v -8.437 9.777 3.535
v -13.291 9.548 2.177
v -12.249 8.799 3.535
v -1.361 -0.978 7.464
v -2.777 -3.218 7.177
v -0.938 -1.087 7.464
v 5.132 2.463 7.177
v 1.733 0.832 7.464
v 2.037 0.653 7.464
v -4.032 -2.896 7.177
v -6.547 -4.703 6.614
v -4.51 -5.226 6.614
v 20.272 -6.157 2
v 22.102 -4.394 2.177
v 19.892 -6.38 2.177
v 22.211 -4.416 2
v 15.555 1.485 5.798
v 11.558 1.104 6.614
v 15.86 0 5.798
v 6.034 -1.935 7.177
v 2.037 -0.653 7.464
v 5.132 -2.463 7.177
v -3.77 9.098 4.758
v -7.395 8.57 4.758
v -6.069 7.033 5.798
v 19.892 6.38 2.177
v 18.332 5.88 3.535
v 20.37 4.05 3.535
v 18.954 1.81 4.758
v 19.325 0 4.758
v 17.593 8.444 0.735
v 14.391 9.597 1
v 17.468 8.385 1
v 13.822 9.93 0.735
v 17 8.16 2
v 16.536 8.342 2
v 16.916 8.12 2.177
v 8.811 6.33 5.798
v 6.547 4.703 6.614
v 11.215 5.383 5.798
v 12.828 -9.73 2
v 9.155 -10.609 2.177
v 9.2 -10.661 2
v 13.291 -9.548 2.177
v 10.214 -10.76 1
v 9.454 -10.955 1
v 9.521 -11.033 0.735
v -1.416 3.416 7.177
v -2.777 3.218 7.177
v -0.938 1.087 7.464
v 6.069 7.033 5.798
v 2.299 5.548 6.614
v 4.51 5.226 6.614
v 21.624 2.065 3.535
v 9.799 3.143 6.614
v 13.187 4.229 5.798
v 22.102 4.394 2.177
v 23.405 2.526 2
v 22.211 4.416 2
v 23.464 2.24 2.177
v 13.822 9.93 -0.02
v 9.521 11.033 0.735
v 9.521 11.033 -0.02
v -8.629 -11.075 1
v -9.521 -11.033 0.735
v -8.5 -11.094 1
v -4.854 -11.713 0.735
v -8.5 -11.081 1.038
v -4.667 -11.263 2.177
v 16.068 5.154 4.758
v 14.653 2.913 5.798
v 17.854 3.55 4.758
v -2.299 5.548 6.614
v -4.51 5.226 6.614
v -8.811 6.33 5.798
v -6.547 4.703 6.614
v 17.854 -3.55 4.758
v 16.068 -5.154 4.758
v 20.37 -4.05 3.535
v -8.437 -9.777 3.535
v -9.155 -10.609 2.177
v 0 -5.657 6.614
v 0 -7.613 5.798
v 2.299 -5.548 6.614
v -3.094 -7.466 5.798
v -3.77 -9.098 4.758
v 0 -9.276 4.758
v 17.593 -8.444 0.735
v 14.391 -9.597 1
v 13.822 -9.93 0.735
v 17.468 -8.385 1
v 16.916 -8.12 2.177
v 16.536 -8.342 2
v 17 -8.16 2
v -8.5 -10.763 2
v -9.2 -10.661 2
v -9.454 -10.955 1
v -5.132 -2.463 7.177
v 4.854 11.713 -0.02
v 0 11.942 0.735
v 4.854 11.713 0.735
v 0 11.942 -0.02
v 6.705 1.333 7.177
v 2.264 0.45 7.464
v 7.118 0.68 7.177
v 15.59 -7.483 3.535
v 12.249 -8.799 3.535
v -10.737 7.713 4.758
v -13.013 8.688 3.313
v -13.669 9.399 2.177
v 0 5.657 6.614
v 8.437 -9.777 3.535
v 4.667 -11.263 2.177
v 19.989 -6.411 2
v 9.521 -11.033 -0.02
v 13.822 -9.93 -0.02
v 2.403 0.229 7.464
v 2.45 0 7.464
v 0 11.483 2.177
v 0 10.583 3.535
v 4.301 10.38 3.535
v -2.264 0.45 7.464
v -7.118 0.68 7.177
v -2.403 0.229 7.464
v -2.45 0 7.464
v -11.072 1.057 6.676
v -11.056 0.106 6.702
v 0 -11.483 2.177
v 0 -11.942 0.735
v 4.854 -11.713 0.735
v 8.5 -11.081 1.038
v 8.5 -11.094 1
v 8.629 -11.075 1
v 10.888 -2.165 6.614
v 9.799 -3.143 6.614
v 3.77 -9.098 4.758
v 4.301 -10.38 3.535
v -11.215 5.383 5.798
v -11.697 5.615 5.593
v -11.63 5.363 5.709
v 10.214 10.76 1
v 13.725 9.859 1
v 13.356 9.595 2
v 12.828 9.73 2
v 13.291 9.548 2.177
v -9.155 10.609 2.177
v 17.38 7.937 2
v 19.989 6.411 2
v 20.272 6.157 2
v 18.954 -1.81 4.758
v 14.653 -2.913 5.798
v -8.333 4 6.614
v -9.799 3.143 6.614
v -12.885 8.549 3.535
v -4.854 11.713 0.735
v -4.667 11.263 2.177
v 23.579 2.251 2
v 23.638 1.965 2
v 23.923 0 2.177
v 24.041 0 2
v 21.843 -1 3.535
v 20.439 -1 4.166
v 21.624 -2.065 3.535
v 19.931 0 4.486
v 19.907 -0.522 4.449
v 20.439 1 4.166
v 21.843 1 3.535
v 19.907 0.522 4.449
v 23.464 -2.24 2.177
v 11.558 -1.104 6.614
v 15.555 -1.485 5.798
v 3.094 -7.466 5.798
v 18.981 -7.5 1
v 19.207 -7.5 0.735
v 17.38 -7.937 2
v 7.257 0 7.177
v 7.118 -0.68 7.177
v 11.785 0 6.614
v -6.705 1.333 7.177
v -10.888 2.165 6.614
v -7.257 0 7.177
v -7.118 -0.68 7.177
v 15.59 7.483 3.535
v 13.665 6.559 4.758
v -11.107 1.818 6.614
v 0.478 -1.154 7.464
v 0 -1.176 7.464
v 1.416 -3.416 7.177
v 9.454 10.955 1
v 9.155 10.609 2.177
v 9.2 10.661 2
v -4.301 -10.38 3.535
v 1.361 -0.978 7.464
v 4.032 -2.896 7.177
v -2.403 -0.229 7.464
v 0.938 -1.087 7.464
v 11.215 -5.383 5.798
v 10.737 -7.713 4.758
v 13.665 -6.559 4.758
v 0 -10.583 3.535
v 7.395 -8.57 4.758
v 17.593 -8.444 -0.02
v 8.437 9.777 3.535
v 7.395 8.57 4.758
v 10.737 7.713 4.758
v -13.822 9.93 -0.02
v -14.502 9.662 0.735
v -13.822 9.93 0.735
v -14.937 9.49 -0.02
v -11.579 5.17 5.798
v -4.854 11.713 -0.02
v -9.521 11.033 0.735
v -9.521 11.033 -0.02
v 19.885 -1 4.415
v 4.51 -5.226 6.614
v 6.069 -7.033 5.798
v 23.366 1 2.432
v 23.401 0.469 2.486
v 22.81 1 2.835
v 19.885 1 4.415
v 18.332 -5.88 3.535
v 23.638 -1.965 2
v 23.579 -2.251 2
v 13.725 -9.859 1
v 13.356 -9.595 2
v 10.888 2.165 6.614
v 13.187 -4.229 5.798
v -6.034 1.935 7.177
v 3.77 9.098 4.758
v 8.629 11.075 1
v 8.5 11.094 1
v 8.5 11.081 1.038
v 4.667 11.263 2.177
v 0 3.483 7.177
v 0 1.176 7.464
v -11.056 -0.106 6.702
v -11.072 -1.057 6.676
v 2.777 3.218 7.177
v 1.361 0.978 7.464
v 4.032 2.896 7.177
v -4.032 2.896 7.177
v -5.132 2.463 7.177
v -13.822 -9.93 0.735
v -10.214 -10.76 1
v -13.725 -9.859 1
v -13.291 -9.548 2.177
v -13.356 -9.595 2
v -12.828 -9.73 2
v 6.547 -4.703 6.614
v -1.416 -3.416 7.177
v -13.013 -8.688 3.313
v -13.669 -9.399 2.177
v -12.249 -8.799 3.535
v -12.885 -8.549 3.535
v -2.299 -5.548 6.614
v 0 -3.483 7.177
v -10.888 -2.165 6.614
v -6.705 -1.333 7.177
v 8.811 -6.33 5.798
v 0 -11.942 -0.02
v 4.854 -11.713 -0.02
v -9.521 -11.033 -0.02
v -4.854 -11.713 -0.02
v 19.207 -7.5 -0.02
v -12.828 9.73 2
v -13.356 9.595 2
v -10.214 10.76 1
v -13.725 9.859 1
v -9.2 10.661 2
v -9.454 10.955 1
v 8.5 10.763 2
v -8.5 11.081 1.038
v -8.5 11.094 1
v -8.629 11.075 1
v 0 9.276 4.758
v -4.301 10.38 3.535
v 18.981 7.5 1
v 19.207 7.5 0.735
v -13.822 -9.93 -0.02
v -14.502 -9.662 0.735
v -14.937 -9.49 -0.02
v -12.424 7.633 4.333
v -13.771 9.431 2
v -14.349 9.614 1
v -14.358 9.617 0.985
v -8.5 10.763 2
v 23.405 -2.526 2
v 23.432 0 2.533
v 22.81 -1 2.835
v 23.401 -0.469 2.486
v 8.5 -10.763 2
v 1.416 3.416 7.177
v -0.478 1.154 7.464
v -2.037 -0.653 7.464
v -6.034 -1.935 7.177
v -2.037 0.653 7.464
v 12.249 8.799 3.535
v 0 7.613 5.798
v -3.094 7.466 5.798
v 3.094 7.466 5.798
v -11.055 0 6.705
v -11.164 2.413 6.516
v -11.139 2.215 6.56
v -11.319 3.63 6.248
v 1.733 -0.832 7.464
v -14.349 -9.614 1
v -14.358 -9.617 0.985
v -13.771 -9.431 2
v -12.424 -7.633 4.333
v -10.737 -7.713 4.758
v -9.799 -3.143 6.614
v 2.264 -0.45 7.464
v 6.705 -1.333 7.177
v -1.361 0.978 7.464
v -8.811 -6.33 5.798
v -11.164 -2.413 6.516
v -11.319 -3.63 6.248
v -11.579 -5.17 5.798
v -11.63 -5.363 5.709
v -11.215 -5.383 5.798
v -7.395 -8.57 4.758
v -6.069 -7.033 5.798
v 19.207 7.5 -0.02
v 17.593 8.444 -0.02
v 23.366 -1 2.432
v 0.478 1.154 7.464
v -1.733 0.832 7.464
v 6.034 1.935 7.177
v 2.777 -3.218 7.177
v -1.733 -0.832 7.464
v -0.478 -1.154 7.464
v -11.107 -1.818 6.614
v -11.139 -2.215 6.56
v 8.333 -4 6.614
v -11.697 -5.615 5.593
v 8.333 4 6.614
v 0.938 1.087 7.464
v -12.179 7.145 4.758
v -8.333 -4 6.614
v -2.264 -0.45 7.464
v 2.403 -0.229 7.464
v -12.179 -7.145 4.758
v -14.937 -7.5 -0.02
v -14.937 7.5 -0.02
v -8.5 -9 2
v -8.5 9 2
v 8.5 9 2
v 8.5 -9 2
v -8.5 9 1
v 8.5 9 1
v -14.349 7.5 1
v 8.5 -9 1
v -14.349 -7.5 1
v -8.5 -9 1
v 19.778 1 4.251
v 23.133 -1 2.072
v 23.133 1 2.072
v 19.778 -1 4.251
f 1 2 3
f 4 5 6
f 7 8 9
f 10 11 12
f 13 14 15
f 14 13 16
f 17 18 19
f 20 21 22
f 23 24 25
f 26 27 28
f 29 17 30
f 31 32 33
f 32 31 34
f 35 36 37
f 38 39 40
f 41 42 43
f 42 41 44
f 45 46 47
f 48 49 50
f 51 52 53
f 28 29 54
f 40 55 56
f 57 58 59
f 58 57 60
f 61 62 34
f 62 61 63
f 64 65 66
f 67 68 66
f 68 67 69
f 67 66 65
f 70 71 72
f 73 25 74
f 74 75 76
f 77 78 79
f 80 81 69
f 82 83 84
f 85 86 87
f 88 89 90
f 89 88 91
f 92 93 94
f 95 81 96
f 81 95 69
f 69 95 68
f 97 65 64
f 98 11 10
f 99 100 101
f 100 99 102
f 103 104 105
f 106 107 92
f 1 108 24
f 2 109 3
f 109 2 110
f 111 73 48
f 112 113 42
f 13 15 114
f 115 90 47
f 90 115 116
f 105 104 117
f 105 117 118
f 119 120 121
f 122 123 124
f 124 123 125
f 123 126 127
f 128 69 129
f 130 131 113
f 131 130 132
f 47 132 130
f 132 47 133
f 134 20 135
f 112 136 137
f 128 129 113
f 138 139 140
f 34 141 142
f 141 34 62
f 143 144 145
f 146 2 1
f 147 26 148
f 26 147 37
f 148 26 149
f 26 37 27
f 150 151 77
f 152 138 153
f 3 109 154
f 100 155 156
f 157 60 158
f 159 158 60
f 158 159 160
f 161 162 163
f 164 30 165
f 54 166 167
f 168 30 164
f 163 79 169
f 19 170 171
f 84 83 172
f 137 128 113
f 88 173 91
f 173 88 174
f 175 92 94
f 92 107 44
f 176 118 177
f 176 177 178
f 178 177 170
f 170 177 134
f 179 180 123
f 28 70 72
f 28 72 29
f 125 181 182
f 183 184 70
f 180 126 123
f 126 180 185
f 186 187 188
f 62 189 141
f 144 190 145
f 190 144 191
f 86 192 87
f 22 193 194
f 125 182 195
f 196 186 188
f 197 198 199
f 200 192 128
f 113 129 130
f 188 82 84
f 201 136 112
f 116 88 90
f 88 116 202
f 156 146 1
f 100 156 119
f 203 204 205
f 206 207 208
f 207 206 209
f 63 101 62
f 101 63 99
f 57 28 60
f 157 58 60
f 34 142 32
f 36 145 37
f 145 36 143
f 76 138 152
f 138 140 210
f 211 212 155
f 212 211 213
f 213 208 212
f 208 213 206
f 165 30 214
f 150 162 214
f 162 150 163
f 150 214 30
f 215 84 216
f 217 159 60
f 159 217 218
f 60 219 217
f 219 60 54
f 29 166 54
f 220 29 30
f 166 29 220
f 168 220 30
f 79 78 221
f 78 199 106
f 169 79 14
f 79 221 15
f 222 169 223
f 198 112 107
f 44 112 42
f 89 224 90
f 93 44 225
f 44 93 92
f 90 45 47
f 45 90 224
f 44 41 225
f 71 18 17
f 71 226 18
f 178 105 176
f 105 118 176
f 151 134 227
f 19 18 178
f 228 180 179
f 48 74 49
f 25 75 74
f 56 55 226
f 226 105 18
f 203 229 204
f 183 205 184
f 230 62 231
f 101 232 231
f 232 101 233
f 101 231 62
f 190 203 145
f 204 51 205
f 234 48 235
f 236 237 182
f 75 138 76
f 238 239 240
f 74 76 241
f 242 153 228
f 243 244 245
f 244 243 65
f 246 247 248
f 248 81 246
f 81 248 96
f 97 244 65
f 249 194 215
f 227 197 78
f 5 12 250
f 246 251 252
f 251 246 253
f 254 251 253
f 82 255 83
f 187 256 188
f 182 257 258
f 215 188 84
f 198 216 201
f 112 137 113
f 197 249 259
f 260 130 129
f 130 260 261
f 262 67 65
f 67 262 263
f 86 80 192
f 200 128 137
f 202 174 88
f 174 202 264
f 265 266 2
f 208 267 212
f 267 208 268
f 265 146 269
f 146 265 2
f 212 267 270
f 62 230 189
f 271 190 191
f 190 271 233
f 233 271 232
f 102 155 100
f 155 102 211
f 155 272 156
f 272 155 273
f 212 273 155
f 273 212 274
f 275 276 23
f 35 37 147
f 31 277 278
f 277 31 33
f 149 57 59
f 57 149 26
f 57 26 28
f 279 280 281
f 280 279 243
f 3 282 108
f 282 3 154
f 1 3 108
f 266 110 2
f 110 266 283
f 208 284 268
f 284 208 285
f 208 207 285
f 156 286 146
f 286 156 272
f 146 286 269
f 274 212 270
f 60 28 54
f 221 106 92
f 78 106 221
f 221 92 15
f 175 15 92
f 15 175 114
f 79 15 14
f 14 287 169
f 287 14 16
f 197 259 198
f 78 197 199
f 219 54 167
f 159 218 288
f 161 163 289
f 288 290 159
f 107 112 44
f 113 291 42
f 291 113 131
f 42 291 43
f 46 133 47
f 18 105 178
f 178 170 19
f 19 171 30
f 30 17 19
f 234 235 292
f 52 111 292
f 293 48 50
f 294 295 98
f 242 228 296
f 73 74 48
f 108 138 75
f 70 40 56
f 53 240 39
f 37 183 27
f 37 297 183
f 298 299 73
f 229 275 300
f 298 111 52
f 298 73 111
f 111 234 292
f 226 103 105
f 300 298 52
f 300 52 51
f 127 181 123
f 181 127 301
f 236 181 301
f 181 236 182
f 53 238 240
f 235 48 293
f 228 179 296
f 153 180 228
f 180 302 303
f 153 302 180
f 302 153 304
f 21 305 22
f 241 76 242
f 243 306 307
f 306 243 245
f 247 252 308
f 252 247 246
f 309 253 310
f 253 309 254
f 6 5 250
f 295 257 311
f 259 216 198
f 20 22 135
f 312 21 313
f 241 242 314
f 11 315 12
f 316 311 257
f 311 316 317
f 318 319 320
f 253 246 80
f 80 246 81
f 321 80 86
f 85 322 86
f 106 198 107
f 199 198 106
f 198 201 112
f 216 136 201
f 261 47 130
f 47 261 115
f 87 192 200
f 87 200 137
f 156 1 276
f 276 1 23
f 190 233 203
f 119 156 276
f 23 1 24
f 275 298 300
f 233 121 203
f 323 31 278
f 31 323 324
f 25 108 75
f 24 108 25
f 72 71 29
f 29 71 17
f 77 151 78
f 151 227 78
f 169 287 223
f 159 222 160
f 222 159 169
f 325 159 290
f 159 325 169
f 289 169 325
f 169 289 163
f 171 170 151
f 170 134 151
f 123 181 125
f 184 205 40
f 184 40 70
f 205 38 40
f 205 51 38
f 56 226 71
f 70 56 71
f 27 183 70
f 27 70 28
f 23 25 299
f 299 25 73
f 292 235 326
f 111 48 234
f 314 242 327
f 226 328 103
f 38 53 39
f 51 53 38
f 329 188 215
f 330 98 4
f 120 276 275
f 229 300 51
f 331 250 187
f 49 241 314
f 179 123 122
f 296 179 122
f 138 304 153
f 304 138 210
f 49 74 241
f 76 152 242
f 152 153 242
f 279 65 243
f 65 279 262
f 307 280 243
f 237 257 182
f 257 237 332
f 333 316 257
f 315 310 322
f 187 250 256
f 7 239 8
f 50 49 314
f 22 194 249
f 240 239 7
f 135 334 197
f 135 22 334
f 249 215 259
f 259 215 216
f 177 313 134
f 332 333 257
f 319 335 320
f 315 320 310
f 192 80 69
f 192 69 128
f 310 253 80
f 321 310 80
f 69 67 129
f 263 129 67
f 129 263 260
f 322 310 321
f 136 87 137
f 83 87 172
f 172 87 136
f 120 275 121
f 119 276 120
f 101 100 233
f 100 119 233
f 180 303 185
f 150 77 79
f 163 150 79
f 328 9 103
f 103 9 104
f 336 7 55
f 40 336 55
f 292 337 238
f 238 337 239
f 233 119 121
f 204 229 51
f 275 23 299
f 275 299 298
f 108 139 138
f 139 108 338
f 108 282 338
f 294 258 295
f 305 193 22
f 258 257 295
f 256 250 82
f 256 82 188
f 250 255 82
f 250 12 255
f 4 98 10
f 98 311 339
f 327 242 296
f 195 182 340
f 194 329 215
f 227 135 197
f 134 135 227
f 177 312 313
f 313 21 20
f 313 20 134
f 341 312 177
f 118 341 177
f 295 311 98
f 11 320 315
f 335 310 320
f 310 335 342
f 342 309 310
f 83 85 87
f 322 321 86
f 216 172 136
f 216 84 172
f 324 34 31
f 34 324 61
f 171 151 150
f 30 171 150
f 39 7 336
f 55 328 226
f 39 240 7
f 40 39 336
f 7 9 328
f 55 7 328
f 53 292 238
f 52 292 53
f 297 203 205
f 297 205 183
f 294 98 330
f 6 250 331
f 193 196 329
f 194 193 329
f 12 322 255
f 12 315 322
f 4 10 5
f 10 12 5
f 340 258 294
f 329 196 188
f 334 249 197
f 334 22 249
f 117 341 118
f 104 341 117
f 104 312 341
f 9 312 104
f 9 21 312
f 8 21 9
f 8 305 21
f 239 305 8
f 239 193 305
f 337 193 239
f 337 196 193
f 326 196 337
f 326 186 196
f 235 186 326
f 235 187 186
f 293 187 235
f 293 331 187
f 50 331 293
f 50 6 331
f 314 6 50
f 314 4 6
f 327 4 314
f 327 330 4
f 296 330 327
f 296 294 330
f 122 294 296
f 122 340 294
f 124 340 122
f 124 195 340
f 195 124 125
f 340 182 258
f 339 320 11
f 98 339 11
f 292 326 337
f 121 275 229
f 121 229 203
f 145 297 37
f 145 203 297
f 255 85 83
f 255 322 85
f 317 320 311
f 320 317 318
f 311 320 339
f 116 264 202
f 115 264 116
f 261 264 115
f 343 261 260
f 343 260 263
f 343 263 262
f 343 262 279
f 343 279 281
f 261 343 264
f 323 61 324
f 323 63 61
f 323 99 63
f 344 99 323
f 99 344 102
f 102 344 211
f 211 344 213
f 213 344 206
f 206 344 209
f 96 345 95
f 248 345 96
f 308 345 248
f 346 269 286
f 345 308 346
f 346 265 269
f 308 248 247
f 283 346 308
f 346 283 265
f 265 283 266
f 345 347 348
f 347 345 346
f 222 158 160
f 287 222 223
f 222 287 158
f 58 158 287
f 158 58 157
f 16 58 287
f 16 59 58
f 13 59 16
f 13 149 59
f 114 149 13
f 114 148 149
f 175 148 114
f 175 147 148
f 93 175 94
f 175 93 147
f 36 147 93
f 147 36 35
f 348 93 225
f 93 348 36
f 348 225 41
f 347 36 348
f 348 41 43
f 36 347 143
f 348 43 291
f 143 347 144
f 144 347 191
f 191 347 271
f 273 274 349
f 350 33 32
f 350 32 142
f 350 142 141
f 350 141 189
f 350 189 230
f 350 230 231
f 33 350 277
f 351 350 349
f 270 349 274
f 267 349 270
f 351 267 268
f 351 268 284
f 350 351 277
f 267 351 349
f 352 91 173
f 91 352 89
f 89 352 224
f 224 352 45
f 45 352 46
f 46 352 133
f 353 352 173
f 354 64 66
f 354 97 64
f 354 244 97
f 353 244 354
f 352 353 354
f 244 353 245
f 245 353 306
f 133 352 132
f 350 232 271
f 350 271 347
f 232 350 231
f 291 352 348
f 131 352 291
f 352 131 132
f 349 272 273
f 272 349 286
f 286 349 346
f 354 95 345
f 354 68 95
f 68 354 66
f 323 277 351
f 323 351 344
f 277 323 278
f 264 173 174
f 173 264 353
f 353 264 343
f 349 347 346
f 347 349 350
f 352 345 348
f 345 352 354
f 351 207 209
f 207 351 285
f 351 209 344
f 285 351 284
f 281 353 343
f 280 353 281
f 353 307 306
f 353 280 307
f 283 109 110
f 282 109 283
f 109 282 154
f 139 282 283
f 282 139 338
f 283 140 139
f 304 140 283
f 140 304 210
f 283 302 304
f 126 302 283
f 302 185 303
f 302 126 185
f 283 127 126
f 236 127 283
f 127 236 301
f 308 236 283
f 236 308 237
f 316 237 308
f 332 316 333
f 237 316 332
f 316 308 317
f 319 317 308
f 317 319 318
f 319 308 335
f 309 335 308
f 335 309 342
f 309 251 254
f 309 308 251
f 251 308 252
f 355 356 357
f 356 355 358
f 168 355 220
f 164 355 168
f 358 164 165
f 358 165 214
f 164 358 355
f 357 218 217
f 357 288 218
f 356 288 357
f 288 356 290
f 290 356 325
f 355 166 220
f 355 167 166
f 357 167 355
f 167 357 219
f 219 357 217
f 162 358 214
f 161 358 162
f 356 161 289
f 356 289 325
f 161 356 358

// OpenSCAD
// file: ../lib/util.scad
fn1 = 32;
fn2 = 16;

module util_half_sphere(radius, fn=fn1) {
    difference() {
        sphere(radius, $fn=fn);
        translate([0,0,-(radius+radius/19)])
            cube(2*radius+radius/10, center=true);
    }
}

function gcd(a,b) = a == b ? a : a > b ? gcd(a-b, b) : gcd(a, b-a);

module util_saucer(length, width, height, fn=fn1) {
    rad = gcd(length,gcd(width,height));
    //rad = 10;
    scale([length/(2*rad), width/(2*rad), height/rad])
        util_half_sphere(rad, fn);
}

module util_half_cylinder(length, radius, inner_fn=fn2, outer_fn=fn1) {
    maxval = max(length, 2*radius);
    intersection() {
        difference() {
            rotate([0,90,0])
                translate([0,0,-(length/2 + length/20)])
                    cylinder(length+length/10, radius, radius, $fn=inner_fn);
            
            translate([0,0,(maxval/2 + maxval/19)])
                cube(maxval+maxval/10, center=true);
        }
        
        translate([0,0,-(radius+radius/20)])
            cylinder(radius + radius/10, length/2, length/2, $fn=outer_fn);
    }
}

module util_body(length, width, height, upper_height, fn=fn1) {
    rad = gcd(length, gcd(width, upper_height));
    
    scale(.995) scale([length/(2*rad), width/(2*rad), 1])
        util_half_cylinder(2*rad, height, outer_fn=fn);
}

module util_graded_cylinder(height, radius_start, radius_end, grades=1, fn=fn1) {
    height_grade = height / grades;
    radius_grade = (radius_start - radius_end) / (grades * grades);
    for (i = [0 : 1 : grades]) {
        translate([0,0,i*height_grade])
            cylinder(height_grade, 
                     radius_start - i*radius_grade * i,
                     radius_start - (i+1) * radius_grade * (i+1),
                     $fn = fn);
    }
}

module util_nacelle(length, width, height, curved=false, up=true, front_bulge=false) {
    rad = min(width, height/2);
    grads = curved ? 6 : 1;
    scale_factor = front_bulge ? 1.1 : 1;
    direction = up ? -1 : 1;
    difference() {
        scale([1, width/ (2*rad), height/rad])
            difference() {
                union() {
                    rotate([0,-90,0])
                        rotate(30)
                            util_graded_cylinder(length-rad, rad, rad/2, grads, 6);
                    scale(scale_factor) 
                        rotate([0,90,0]) rotate(90) sphere(rad, $fn=6);
                }
                
                translate([-length/2, 0, direction * (height/2 + height/19)])
                    cube([length+length, width+width, height+height/10], center=true);
            }
        
        translate([-length-(curved?length/3:0), 0, -length/3])
            rotate([0,-45,0])
                cube(length, center=true);
    }
}

module util_mirrored(v) {
    children();
    mirror(v) children();
}

module util_ring(outer, inner, height) {
    difference() {
        translate([0,0,-height/2])
            cylinder(height, outer, outer);
        translate([0,0,-(height/2 + height/19)])
            cylinder(height+height/10, inner, inner);
    }
}

module util_star(radius, thick, num, half=false) {
    angle = 360/num;
    offset = half? angle/2 : 0;
    for (i = [0: 1: num]) {
        rotate(i* angle + offset)
            translate([radius/2,0,0])
                cube([radius, thick, thick], center=true);
    }
}

module util_ring_star(radius, thick, num, inner, half=false) {
    outer=inner+thick;
    avg = (inner + outer)/2;
    union() {
        difference() {
            util_star(radius, thick, num, half);
            cylinder(2*thick, outer, outer, $fn=num, center=true);
        }
        util_ring(outer, inner, thick);
    }
}

module util_hangar_disk(height, lower, upper, num, fn=fn1) {
    difference() {
            cylinder(height, lower, upper, $fn=fn, center=true);
        difference() {
            scale([1,1,22])
                util_star(1.1*upper, height/20, num, half=true);
            scale(.95)
                cylinder(height, lower, upper, $fn=fn, center=true);
        }
    }
}

module util_hangar_form(length, width, height, num, inner=0) {
    l = 0.6* max(length, width);
    h = 2.5* height;
    thick = min(height/20,1);
    inner = inner == 0 ? l/3 : inner;
    difference() {
        children();
        scale([1,1,h/thick]) 
            util_ring_star(l, thick, num, inner, half=true);
    }
    scale(.95) children();
}

module util_nacelle_bar(span, height, width, thickness) {
    rad = (span*span/(8*height) + height/2);
    outer = rad + thickness/2;
    inner = rad - thickness/2;
    difference(){
        translate([0,0,outer])
            rotate([0,90,0])
                util_ring(outer, inner, width);
    
        translate([0,0,1.1*outer+height])
            cube(2.2*outer, center=true);
    }
}
// main file
use <../lib/util.scad>;

module science() {
    difference() {
        util_saucer(50,24,7.5);
        
        union() {
            cube([50,15,4], center=true);
            translate([0,0,1.5])
                cube([50,18,1], center=true);
            util_mirrored([1,0,0])
            translate([16,0,1.5])
            cube([15,24,1],center=true);
            translate([-20,0,6.8])
                scale([1.5,1,1.5])
                rotate([90,0,0])
                    cylinder(24,6,6,center=true,$fn=6);
//            translate([-14,0,-2])
//                rotate([90,0,0])
//                    cylinder(24,6,6,center=true,$fn=6);
            translate([22,0,4])
                rotate([0,-57,0])
                    cube([2,2,4], center=true);
//            util_mirrored([0,1,0])
//                translate([0,14,-.1])
//                    scale([1,1.5,1])
//                    rotate(90)
//                        rotate([90,0,0])
//                            cylinder(40,3,3,center=true,$fn=6);
        }
    }
}



science();
